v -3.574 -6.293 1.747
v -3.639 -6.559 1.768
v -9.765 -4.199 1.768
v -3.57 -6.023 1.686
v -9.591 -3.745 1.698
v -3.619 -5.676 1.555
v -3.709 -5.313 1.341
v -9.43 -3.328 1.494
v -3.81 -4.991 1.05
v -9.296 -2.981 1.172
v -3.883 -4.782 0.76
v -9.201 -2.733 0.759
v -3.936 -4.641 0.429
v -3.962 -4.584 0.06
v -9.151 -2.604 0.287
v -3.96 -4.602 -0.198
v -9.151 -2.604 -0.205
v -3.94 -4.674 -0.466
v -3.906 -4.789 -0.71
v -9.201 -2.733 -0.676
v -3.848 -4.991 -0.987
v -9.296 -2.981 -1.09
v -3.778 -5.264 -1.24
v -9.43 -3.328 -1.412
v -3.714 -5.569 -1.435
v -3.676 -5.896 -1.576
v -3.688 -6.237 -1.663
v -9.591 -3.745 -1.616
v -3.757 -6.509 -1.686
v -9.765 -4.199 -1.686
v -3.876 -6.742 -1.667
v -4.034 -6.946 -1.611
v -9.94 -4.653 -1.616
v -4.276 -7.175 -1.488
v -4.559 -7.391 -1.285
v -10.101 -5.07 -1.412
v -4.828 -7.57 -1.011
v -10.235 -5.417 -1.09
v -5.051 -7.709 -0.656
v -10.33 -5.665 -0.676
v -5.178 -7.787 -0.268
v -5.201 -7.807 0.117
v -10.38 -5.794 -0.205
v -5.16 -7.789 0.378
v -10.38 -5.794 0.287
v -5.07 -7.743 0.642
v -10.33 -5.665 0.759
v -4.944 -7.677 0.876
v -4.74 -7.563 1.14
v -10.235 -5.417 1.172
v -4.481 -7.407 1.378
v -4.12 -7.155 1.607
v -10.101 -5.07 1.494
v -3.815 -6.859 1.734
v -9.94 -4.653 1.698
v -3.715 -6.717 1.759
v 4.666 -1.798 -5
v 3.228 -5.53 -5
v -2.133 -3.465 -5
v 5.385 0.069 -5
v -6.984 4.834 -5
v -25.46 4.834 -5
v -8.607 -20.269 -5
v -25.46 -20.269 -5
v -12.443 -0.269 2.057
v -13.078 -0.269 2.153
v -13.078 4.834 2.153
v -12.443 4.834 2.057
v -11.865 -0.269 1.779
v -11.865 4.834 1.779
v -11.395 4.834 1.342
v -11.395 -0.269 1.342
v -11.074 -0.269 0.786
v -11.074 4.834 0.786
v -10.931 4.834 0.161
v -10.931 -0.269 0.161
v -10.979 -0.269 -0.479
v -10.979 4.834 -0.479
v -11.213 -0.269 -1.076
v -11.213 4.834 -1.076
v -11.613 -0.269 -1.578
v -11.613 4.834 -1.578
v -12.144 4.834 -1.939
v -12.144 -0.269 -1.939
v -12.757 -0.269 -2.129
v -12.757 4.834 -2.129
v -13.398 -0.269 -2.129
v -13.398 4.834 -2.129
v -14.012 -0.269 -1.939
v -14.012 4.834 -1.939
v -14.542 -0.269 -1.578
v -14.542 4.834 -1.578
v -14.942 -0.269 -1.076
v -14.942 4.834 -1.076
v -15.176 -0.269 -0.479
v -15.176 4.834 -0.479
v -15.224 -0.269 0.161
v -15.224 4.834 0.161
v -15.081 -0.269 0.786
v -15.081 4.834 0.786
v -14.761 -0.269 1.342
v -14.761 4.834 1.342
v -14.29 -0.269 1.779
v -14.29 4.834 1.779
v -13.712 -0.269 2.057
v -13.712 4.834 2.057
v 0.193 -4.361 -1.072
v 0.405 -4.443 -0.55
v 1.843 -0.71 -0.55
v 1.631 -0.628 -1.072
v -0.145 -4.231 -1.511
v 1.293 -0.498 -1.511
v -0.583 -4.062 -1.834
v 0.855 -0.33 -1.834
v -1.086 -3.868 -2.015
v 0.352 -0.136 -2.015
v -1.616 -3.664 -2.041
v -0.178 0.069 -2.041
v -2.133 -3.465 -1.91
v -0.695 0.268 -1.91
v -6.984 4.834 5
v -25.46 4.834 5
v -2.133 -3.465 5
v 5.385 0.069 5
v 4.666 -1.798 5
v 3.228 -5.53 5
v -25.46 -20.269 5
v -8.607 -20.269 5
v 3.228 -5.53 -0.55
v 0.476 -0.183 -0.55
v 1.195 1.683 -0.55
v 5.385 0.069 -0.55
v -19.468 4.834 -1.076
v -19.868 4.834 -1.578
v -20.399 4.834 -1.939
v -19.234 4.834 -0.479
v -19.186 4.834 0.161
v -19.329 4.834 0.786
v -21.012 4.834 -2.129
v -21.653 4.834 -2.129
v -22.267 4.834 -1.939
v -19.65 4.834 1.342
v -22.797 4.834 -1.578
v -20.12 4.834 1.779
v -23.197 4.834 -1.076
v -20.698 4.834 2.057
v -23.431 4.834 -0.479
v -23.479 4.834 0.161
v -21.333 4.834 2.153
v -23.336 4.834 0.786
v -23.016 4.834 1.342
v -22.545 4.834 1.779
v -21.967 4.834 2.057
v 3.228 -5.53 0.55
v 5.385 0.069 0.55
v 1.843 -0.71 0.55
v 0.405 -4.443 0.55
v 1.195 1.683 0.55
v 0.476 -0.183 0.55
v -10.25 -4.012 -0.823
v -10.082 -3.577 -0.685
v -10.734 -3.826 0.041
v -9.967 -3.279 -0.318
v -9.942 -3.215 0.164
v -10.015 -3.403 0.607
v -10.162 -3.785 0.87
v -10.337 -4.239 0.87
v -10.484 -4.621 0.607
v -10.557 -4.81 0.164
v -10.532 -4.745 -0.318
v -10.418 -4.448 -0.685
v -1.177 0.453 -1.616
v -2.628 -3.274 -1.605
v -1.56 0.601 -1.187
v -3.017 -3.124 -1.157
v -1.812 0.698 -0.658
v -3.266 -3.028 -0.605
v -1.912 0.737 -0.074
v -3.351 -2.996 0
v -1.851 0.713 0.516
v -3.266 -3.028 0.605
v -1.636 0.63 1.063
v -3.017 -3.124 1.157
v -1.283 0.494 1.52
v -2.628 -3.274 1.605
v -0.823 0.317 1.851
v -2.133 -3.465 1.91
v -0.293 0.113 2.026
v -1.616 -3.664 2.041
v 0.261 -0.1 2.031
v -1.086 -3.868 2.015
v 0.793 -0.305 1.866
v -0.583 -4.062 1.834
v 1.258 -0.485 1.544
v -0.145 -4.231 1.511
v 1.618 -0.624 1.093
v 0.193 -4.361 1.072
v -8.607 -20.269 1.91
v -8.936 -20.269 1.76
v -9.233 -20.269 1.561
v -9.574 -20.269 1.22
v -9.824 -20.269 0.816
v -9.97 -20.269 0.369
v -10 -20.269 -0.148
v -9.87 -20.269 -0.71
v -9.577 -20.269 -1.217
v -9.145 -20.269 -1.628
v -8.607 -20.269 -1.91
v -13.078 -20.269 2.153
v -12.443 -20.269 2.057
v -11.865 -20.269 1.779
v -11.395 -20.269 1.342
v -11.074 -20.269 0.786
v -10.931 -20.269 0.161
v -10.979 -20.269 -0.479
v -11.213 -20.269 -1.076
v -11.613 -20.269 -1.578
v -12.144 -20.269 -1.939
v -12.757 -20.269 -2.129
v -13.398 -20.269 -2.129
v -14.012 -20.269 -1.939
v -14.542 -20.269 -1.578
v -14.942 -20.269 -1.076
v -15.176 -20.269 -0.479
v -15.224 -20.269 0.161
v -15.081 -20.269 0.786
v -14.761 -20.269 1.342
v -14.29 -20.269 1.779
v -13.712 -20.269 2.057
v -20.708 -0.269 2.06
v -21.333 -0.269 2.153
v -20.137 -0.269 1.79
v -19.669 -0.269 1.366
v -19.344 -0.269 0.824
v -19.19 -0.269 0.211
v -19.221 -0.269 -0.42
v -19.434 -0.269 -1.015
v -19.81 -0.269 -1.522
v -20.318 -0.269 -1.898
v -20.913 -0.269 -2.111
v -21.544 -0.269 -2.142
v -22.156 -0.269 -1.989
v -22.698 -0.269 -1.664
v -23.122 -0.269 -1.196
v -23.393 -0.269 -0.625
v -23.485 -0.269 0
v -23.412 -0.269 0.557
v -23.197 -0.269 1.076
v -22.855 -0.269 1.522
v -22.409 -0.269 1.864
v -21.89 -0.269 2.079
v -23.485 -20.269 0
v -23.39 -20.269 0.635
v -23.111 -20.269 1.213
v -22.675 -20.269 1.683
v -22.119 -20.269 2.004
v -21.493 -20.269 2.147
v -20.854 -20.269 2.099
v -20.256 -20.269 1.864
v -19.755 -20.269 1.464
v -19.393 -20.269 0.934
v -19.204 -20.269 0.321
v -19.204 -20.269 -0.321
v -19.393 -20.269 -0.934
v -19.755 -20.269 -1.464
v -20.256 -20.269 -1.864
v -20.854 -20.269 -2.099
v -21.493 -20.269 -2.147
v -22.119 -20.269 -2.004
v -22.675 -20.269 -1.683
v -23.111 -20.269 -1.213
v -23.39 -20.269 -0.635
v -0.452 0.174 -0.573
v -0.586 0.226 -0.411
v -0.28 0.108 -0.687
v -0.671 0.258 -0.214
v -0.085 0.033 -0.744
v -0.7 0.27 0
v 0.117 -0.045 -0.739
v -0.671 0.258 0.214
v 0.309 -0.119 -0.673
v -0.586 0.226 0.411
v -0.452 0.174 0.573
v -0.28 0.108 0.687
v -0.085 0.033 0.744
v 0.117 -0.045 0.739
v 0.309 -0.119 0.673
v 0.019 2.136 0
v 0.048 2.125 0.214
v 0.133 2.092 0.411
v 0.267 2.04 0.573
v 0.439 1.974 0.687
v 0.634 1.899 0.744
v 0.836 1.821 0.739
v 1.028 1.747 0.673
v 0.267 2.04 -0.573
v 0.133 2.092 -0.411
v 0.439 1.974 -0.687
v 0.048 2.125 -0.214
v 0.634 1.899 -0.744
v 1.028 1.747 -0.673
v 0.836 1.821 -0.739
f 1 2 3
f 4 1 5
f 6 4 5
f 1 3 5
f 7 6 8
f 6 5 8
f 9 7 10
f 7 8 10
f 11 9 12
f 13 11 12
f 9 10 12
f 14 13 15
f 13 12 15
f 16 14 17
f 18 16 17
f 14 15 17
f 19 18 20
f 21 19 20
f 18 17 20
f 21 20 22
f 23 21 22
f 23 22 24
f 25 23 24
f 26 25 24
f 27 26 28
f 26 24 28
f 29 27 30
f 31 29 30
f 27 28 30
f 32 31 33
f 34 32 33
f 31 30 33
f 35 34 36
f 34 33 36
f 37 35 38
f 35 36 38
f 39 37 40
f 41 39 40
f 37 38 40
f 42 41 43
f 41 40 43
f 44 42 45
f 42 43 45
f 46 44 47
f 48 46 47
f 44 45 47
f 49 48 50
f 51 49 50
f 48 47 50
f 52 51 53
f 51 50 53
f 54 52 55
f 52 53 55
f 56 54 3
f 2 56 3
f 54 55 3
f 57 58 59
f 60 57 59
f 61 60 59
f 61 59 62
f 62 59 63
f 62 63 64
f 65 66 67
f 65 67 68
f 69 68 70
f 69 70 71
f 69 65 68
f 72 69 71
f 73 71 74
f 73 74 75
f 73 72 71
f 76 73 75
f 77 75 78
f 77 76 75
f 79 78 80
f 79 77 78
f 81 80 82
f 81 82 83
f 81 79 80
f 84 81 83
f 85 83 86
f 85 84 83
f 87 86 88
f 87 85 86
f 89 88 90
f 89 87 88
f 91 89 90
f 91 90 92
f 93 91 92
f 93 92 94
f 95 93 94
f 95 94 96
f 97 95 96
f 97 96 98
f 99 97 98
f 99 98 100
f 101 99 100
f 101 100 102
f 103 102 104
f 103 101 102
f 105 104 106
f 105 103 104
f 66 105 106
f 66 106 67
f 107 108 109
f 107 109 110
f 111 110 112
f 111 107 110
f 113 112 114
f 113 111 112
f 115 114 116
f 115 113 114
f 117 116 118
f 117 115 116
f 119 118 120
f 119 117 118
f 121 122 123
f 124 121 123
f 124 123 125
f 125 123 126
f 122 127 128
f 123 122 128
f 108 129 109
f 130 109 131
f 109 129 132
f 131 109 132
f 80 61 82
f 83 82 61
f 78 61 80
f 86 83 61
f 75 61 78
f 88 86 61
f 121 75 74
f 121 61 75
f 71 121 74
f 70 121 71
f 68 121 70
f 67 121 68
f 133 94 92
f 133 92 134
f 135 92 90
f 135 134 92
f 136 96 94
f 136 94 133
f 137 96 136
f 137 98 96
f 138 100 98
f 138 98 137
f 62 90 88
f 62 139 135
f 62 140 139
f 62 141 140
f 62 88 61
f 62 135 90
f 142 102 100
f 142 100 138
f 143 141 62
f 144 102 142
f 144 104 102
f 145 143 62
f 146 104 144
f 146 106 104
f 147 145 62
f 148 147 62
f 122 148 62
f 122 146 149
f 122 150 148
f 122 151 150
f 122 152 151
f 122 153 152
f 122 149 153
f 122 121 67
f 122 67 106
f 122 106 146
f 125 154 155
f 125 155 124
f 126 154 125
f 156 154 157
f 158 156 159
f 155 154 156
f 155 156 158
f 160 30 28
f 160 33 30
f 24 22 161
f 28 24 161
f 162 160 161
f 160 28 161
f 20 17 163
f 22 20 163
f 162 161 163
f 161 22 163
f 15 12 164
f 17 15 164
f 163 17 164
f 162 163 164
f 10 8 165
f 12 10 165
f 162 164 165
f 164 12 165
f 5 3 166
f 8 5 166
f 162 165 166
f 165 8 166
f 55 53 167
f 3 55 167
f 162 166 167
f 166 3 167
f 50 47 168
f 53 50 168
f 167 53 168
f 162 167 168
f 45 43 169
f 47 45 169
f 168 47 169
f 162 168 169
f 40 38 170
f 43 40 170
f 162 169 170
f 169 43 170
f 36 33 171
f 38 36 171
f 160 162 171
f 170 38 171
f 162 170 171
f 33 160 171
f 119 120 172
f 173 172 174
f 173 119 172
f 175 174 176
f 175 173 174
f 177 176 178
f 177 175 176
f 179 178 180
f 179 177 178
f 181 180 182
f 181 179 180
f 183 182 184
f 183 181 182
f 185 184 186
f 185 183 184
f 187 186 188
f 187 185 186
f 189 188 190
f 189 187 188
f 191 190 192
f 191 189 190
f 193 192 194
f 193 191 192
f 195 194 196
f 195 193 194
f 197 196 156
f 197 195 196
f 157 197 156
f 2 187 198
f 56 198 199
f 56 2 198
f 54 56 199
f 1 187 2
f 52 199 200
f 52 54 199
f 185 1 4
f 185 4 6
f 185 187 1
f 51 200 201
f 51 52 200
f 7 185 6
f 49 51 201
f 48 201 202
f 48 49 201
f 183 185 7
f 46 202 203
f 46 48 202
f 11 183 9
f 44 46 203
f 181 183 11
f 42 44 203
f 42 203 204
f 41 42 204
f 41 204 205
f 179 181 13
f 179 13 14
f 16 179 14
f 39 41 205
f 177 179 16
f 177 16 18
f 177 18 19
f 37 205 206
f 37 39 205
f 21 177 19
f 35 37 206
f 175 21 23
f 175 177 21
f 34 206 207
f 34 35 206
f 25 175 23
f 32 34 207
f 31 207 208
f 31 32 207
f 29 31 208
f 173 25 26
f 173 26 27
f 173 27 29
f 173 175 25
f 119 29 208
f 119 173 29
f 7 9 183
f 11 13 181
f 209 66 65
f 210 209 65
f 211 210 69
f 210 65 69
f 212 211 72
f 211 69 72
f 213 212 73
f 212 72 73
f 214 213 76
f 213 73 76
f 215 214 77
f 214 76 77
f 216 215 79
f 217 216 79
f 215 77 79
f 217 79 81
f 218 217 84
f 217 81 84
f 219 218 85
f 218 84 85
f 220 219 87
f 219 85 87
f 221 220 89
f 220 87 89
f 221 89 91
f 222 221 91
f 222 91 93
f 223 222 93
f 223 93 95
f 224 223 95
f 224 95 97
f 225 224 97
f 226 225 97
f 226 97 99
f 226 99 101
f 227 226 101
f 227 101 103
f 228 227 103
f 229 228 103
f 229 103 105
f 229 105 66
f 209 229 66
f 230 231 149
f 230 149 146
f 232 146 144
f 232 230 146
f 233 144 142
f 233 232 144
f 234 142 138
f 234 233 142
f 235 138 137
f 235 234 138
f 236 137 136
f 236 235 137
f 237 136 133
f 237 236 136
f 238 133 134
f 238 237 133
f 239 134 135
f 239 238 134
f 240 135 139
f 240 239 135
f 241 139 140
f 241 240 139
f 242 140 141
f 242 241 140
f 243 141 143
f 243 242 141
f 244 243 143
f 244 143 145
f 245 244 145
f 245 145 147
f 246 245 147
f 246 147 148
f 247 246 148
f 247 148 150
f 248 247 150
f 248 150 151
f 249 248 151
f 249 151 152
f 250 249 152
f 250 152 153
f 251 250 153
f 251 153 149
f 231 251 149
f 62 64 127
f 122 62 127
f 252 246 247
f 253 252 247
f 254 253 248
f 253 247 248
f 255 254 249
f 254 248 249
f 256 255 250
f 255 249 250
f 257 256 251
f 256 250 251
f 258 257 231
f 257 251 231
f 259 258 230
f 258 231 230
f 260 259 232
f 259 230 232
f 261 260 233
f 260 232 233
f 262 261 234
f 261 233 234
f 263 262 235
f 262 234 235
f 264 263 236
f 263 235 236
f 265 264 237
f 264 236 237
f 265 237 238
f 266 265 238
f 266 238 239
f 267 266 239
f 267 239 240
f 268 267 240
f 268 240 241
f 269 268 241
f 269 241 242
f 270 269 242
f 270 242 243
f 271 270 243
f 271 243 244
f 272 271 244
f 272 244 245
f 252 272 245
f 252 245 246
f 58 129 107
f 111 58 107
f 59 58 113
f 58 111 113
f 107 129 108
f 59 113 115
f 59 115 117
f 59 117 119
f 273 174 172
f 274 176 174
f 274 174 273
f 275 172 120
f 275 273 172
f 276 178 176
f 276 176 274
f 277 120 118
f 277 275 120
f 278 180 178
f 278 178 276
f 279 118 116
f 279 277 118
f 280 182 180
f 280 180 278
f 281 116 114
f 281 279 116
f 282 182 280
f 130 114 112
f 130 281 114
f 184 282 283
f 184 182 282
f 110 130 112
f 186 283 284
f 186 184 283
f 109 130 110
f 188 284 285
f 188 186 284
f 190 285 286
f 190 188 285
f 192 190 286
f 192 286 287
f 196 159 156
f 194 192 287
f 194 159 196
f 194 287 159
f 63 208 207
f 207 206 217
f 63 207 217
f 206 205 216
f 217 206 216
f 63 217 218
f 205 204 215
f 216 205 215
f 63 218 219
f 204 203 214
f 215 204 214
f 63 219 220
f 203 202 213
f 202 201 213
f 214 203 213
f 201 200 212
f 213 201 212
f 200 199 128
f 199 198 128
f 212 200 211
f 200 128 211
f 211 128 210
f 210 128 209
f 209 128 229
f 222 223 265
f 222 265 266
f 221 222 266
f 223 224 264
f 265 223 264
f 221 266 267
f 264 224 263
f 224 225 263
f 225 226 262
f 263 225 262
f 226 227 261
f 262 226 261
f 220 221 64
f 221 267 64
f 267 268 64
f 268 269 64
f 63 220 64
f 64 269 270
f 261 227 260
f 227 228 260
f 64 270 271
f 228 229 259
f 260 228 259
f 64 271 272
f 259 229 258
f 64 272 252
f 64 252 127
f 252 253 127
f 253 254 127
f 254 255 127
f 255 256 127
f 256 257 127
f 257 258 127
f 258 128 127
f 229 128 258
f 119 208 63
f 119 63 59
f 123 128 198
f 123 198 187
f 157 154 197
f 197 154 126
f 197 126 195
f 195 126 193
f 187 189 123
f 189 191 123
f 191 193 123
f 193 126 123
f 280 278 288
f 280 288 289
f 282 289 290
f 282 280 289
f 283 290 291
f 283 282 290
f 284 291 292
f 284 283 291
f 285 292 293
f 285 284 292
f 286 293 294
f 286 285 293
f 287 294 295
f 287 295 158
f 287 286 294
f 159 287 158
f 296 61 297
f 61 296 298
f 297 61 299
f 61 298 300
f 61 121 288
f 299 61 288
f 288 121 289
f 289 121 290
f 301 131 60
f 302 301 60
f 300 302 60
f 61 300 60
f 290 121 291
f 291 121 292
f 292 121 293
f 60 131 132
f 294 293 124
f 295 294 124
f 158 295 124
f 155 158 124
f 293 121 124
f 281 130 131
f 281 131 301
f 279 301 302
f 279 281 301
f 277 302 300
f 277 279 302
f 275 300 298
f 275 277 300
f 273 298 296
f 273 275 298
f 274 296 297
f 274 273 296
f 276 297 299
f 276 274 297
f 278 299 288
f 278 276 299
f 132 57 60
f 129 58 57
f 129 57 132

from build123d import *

# Parameters (mm, degrees)
BASE_EXTRUDE_DEPTH                 = 5
CUTAWAY_FOR_CLAMP_PLATE_WIRE_DEPTH = 11
HOLES_TO_PITCH_PLATE_REACH         = 22
SKETCH4_R                          = 2.15265
SKETCH5_R                          = 2.05
EXTRUDE1_DEPTH                     = 4
SKETCH6_R                          = 0.75
EXTRUDE2_DEPTH                     = 2
SKETCH8_W                          = 18.476012794
SKETCH8_H                          = 10
SKETCH8_R                          = 2.15265
EXTRUDE3_DEPTH                     = 5.102995
SKETCH7_R                          = 2.05
CUT_EXTRUDE1_DEPTH                 = 25.066935872
CUT_EXTRUDE3_REACH                 = 32.496
SKETCH12_W                         = 1.1
SKETCH12_H                         = 6
F_8_32_TAPPED_HOLE1_D              = 3.4544
F_8_32_TAPPED_HOLE1_DEPTH          = 6.858
F_8_32_TAPPED_HOLE1_TIP            = 1.037806461


with BuildPart() as part:
    # Sketch1 → Base-Extrude (new body, symmetric)
    with BuildSketch(Plane.XY):
        Polygon((-7.703086391, 2.967740731), (0, 0), (7.703086391, -2.967740731), (1.037503031, -20.268970563), (-25.460082654, -20.268970563), (-25.460082654, -0.268970563), (-8.950082654, -0.268970563), align=None)
    extrude(amount=BASE_EXTRUDE_DEPTH, both=True)

    # Sketch2 → Cutaway for Clamp Plate & Wire (cut, through all)
    with BuildSketch(Plane.XY.offset(5)):
        Polygon((-7.703086391, 2.967740731), (7.703086391, -2.967740731), (1.037503031, -20.268970563), (-8.607332328, -20.268970563), (-2.133223778, -3.464733945), (-9.141119453, -0.764826872), align=None)
    extrude(amount=-CUTAWAY_FOR_CLAMP_PLATE_WIRE_DEPTH, mode=Mode.SUBTRACT)

    # Sketch4 → Holes to Pitch Plate (cut, up to next)
    with BuildSketch(Plane(origin=(0, -0.268970563, 0), x_dir=(-1, 0, 0), z_dir=(0, 1, 0)), mode=Mode.PRIVATE) as holes_to_pitch_plate_sk1:
        with Locations((21.332582654, 0)):
            Circle(SKETCH4_R)
    holes_to_pitch_plate_tool1 = extrude(holes_to_pitch_plate_sk1.sketch, amount=-HOLES_TO_PITCH_PLATE_REACH, mode=Mode.PRIVATE) & part.part
    add(holes_to_pitch_plate_tool1.solids().sort_by_distance((-21.332583, -0.268971, 0))[0], mode=Mode.SUBTRACT)
    # Sketch4 → Holes to Pitch Plate (cut, up to next)
    with BuildSketch(Plane(origin=(0, -0.268970563, 0), x_dir=(-1, 0, 0), z_dir=(0, 1, 0)), mode=Mode.PRIVATE) as holes_to_pitch_plate_sk2:
        with Locations(Location((13.077582654, 0, 0), (0, 0, 90))):  # turned: the seam where the file's is
            Circle(SKETCH4_R)
    holes_to_pitch_plate_tool2 = extrude(holes_to_pitch_plate_sk2.sketch, amount=-HOLES_TO_PITCH_PLATE_REACH, mode=Mode.PRIVATE) & part.part
    add(holes_to_pitch_plate_tool2.solids().sort_by_distance((-13.077583, -0.268971, 0))[0], mode=Mode.SUBTRACT)

    # Sketch5 → Extrude1 (add)
    with BuildSketch(Plane(origin=(-1.438033062, -3.732567603, 0), x_dir=(-0.933141901, 0.359508265, 0), z_dir=(0.359508265, 0.933141901, 0))):
        Polygon((8.255, 5), (0, 5), (-5, 5), (-5, -5), (0, -5), (8.255, -5), align=None)
        with Locations(Location((0, 0, 0), (0, 0, 291.310049103))):  # turned: the seam where the file's is
            Circle(SKETCH5_R, mode=Mode.SUBTRACT)
    extrude(amount=EXTRUDE1_DEPTH)

    # Sketch6 → Extrude2 (add)
    with BuildSketch(Plane(origin=(0, 0, 0), x_dir=(-0.933141901, 0.359508265, 0), z_dir=(0.359508265, 0.933141901, 0))):
        Polygon((0, 5), (8.255, 5), (8.255, -5), (0, -5), (-5, -5), (-5, 5), align=None)
        Circle(SKETCH6_R, mode=Mode.SUBTRACT)
    extrude(amount=EXTRUDE2_DEPTH)

    # Sketch8 → Extrude3 (add)
    with BuildSketch(Plane(origin=(0, -0.268970563, 0), x_dir=(-1, 0, 0), z_dir=(0, 1, 0))):
        with Locations((16.222076257, 0)):
            Rectangle(SKETCH8_W, SKETCH8_H)
        with Locations(Location((21.332582654, 0, 0), (0, 0, 90))):  # turned: the seam where the file's is
            Circle(SKETCH8_R, mode=Mode.SUBTRACT)
        with Locations(Location((13.077582654, 0, 0), (0, 0, 90))):  # turned: the seam where the file's is
            Circle(SKETCH8_R, mode=Mode.SUBTRACT)
    extrude(amount=EXTRUDE3_DEPTH)

    # Sketch7 → Cut-Extrude1 (cut, through all)
    with BuildSketch(Plane(origin=(-1.438033062, -3.732567603, 0), x_dir=(0.933141901, -0.359508265, 0), z_dir=(-0.359508265, -0.933141901, 0))):
        with Locations(Location((0, 0, 0), (0, 0, 248.689950897))):  # turned: the seam where the file's is
            Circle(SKETCH7_R)
    extrude(amount=CUT_EXTRUDE1_DEPTH, mode=Mode.SUBTRACT)

    # Sketch12 → Cut-Extrude3 (cut, up to next)
    with BuildSketch(Plane(origin=(4.665709504, -1.797541327, 0), x_dir=(0, 0, -1), z_dir=(0.933141901, -0.359508265, 0)), mode=Mode.PRIVATE) as cut_extrude3_sk1:
        with Locations((0, -1)):
            Rectangle(SKETCH12_W, SKETCH12_H)
    cut_extrude3_tool1 = extrude(cut_extrude3_sk1.sketch, amount=-CUT_EXTRUDE3_REACH, mode=Mode.PRIVATE) & part.part
    add(cut_extrude3_tool1.solids().sort_by_distance((4.306201, -2.730683, 0))[0], mode=Mode.SUBTRACT)

    # #8-32 Tapped Hole1
    with Locations(Plane(origin=(-0.695190716, 0.267833658, 0), x_dir=(0, 0, -1), z_dir=(0.933141901, -0.359508265, 0))):
        with Locations((-0.041026912, -7.429)):
            Hole(F_8_32_TAPPED_HOLE1_D / 2, depth=F_8_32_TAPPED_HOLE1_DEPTH)
            with Locations((0, 0, -(F_8_32_TAPPED_HOLE1_DEPTH + F_8_32_TAPPED_HOLE1_TIP / 2))):  # 118° drill point
                Cone(0, F_8_32_TAPPED_HOLE1_D / 2, F_8_32_TAPPED_HOLE1_TIP, mode=Mode.SUBTRACT)


solid = part.part
